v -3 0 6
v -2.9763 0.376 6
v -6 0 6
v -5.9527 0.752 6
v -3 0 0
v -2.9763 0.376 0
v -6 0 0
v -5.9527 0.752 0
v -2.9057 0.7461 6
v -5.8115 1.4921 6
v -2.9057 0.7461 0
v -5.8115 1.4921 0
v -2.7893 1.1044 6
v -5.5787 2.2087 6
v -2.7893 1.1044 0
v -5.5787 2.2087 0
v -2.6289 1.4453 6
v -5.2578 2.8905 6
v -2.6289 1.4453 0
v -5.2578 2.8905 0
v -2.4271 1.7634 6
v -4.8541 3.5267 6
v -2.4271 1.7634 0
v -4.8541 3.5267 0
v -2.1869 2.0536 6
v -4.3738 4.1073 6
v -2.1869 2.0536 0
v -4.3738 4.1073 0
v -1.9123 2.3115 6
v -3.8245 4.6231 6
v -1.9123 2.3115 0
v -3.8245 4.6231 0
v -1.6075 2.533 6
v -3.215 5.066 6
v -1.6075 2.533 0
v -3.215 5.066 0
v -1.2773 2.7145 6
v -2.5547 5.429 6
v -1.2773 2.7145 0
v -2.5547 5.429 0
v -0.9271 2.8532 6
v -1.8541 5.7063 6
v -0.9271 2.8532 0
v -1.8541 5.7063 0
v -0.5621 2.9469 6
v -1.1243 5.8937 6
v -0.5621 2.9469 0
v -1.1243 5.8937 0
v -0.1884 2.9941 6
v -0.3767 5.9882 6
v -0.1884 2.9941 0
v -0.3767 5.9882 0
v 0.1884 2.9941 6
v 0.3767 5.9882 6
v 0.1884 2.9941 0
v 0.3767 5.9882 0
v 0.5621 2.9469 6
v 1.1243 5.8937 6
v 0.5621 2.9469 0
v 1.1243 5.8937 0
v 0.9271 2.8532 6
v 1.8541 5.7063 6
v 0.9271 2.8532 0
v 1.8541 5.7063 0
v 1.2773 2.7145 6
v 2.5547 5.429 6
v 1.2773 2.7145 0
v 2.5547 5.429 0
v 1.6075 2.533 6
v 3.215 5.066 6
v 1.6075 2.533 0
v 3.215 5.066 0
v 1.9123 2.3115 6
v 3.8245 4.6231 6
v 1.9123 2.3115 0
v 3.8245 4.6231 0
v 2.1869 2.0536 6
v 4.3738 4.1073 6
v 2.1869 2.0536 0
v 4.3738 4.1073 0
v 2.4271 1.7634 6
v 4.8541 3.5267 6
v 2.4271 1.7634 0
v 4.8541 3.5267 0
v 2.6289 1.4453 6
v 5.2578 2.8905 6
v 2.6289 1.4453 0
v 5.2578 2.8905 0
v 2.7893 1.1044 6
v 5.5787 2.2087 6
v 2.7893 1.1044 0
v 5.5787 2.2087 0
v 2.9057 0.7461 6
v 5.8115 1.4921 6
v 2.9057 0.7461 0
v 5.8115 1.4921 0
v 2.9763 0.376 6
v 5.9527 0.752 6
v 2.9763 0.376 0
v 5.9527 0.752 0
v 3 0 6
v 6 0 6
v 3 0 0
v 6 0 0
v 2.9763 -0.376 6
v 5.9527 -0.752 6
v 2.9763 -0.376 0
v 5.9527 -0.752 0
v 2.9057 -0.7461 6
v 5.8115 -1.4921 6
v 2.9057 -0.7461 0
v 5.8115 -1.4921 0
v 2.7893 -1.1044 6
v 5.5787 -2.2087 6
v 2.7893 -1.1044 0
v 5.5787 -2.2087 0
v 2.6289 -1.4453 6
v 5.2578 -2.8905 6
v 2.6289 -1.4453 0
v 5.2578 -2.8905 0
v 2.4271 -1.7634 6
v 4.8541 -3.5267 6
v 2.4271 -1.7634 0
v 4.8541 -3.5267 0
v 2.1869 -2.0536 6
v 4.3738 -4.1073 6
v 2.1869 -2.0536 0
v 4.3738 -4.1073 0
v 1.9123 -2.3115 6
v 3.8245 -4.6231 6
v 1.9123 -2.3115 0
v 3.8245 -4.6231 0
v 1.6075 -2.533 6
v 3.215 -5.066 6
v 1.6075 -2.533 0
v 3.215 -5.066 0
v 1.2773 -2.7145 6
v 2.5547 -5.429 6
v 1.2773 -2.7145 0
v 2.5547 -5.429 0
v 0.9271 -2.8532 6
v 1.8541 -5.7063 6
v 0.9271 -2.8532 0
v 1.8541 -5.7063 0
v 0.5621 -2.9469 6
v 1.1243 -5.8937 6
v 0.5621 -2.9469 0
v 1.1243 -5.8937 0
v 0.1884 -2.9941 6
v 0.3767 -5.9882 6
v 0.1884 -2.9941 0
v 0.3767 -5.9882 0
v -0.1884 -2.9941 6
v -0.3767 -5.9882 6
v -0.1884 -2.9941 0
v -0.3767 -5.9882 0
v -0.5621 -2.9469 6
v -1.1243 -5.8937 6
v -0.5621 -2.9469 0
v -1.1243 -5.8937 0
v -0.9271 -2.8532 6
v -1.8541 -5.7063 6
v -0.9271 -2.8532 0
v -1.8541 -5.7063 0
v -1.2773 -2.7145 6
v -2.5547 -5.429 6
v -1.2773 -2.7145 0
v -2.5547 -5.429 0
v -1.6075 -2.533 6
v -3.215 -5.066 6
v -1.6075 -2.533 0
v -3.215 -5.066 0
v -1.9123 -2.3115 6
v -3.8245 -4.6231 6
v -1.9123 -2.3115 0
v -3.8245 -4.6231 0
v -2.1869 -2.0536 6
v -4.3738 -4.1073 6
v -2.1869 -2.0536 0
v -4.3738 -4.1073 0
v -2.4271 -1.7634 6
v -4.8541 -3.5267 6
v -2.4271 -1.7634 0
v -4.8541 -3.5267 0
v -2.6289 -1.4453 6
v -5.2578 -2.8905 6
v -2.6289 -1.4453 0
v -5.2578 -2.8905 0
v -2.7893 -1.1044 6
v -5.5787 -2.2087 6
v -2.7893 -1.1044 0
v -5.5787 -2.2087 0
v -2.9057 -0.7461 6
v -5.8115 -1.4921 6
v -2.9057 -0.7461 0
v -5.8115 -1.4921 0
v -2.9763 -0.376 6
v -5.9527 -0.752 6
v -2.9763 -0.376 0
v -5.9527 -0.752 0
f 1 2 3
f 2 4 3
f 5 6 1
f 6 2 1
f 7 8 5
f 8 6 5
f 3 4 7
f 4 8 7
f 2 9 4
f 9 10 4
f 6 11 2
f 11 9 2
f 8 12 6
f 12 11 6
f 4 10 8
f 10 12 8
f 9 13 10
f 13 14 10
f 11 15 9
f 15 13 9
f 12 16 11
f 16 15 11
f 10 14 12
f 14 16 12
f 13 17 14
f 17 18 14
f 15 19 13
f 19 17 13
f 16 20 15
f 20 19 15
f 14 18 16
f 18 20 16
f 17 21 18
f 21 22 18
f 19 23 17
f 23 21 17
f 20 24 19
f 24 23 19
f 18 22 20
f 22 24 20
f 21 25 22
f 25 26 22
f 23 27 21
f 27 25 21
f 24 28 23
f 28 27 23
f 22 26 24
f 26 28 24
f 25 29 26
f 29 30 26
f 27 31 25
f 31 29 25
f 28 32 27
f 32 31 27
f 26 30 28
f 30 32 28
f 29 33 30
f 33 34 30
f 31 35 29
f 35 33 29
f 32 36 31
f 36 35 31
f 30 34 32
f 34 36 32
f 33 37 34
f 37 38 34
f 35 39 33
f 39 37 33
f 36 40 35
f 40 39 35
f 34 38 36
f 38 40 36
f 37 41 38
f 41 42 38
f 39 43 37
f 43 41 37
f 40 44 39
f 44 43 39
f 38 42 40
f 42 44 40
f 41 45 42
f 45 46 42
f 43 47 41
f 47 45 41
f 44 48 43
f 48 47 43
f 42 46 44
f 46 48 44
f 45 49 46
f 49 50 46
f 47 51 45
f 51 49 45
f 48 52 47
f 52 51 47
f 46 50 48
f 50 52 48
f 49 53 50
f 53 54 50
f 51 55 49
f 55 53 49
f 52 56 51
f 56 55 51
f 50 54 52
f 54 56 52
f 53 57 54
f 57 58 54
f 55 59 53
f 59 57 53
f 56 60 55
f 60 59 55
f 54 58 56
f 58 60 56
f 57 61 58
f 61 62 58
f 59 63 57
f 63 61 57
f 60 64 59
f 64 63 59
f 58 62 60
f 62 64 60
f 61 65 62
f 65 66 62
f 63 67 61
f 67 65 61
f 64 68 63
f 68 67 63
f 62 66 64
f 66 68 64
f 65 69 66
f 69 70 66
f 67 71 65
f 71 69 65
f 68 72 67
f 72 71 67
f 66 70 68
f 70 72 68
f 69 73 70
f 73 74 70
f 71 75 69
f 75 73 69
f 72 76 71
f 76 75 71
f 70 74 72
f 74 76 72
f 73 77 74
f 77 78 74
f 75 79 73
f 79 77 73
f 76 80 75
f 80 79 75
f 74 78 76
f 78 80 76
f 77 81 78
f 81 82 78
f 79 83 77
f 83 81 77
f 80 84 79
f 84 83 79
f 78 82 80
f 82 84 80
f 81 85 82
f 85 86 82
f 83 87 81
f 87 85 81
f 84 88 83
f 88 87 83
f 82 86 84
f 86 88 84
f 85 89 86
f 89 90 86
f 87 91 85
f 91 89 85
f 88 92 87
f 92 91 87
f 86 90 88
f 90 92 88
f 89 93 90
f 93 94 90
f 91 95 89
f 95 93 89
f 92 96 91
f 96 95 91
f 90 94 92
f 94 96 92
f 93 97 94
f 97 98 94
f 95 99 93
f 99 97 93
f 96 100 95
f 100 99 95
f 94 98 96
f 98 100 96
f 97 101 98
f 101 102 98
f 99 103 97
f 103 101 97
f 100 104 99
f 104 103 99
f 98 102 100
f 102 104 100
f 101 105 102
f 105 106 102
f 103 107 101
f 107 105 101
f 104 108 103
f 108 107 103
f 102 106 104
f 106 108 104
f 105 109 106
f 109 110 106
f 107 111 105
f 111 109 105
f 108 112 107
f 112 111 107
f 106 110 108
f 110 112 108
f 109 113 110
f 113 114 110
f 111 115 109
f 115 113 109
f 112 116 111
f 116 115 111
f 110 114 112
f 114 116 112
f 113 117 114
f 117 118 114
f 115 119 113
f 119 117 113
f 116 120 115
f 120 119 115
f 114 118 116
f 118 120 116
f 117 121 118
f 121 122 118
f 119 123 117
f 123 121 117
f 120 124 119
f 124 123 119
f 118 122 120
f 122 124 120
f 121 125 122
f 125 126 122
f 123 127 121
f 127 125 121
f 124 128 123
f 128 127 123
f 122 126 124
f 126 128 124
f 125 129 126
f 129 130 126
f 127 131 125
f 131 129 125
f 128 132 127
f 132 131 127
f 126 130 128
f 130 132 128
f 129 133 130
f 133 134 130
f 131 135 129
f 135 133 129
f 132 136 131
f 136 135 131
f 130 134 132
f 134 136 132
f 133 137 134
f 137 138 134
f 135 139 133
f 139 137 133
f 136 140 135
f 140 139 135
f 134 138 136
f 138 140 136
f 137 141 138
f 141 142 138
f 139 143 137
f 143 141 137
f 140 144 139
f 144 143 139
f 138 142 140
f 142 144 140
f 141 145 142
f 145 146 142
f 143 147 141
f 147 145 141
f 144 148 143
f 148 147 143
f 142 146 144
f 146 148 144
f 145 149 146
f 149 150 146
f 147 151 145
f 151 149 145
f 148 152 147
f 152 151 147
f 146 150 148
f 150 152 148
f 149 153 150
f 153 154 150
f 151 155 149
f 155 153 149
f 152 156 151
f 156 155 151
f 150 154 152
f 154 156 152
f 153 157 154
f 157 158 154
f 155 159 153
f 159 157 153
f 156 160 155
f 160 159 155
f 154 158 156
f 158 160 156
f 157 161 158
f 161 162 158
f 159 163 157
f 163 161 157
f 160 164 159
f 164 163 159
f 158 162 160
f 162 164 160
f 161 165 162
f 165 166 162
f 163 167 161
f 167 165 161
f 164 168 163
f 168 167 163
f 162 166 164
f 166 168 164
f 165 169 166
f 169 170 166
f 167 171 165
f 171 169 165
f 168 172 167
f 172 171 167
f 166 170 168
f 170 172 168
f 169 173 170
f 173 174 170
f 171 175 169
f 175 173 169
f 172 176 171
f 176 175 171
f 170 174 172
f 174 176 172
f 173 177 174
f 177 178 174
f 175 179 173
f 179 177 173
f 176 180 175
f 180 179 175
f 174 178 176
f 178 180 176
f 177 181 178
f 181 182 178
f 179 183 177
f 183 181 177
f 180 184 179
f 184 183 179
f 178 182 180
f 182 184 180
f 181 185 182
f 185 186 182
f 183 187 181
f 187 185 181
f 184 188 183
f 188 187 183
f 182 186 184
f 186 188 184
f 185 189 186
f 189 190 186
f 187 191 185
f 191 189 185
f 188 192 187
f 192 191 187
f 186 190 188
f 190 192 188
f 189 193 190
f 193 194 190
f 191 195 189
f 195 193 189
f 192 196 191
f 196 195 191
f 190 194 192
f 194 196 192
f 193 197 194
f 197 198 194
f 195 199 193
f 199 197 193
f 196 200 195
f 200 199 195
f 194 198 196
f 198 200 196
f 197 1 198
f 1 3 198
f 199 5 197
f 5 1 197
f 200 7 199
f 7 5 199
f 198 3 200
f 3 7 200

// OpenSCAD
// washers to mount cube

rotate_extrude(height = 5.5, center = false, convexity = 10, twist = 0, $fn=50)
polygon([[3,0],[6,0],[6,6],[3,6]]);
